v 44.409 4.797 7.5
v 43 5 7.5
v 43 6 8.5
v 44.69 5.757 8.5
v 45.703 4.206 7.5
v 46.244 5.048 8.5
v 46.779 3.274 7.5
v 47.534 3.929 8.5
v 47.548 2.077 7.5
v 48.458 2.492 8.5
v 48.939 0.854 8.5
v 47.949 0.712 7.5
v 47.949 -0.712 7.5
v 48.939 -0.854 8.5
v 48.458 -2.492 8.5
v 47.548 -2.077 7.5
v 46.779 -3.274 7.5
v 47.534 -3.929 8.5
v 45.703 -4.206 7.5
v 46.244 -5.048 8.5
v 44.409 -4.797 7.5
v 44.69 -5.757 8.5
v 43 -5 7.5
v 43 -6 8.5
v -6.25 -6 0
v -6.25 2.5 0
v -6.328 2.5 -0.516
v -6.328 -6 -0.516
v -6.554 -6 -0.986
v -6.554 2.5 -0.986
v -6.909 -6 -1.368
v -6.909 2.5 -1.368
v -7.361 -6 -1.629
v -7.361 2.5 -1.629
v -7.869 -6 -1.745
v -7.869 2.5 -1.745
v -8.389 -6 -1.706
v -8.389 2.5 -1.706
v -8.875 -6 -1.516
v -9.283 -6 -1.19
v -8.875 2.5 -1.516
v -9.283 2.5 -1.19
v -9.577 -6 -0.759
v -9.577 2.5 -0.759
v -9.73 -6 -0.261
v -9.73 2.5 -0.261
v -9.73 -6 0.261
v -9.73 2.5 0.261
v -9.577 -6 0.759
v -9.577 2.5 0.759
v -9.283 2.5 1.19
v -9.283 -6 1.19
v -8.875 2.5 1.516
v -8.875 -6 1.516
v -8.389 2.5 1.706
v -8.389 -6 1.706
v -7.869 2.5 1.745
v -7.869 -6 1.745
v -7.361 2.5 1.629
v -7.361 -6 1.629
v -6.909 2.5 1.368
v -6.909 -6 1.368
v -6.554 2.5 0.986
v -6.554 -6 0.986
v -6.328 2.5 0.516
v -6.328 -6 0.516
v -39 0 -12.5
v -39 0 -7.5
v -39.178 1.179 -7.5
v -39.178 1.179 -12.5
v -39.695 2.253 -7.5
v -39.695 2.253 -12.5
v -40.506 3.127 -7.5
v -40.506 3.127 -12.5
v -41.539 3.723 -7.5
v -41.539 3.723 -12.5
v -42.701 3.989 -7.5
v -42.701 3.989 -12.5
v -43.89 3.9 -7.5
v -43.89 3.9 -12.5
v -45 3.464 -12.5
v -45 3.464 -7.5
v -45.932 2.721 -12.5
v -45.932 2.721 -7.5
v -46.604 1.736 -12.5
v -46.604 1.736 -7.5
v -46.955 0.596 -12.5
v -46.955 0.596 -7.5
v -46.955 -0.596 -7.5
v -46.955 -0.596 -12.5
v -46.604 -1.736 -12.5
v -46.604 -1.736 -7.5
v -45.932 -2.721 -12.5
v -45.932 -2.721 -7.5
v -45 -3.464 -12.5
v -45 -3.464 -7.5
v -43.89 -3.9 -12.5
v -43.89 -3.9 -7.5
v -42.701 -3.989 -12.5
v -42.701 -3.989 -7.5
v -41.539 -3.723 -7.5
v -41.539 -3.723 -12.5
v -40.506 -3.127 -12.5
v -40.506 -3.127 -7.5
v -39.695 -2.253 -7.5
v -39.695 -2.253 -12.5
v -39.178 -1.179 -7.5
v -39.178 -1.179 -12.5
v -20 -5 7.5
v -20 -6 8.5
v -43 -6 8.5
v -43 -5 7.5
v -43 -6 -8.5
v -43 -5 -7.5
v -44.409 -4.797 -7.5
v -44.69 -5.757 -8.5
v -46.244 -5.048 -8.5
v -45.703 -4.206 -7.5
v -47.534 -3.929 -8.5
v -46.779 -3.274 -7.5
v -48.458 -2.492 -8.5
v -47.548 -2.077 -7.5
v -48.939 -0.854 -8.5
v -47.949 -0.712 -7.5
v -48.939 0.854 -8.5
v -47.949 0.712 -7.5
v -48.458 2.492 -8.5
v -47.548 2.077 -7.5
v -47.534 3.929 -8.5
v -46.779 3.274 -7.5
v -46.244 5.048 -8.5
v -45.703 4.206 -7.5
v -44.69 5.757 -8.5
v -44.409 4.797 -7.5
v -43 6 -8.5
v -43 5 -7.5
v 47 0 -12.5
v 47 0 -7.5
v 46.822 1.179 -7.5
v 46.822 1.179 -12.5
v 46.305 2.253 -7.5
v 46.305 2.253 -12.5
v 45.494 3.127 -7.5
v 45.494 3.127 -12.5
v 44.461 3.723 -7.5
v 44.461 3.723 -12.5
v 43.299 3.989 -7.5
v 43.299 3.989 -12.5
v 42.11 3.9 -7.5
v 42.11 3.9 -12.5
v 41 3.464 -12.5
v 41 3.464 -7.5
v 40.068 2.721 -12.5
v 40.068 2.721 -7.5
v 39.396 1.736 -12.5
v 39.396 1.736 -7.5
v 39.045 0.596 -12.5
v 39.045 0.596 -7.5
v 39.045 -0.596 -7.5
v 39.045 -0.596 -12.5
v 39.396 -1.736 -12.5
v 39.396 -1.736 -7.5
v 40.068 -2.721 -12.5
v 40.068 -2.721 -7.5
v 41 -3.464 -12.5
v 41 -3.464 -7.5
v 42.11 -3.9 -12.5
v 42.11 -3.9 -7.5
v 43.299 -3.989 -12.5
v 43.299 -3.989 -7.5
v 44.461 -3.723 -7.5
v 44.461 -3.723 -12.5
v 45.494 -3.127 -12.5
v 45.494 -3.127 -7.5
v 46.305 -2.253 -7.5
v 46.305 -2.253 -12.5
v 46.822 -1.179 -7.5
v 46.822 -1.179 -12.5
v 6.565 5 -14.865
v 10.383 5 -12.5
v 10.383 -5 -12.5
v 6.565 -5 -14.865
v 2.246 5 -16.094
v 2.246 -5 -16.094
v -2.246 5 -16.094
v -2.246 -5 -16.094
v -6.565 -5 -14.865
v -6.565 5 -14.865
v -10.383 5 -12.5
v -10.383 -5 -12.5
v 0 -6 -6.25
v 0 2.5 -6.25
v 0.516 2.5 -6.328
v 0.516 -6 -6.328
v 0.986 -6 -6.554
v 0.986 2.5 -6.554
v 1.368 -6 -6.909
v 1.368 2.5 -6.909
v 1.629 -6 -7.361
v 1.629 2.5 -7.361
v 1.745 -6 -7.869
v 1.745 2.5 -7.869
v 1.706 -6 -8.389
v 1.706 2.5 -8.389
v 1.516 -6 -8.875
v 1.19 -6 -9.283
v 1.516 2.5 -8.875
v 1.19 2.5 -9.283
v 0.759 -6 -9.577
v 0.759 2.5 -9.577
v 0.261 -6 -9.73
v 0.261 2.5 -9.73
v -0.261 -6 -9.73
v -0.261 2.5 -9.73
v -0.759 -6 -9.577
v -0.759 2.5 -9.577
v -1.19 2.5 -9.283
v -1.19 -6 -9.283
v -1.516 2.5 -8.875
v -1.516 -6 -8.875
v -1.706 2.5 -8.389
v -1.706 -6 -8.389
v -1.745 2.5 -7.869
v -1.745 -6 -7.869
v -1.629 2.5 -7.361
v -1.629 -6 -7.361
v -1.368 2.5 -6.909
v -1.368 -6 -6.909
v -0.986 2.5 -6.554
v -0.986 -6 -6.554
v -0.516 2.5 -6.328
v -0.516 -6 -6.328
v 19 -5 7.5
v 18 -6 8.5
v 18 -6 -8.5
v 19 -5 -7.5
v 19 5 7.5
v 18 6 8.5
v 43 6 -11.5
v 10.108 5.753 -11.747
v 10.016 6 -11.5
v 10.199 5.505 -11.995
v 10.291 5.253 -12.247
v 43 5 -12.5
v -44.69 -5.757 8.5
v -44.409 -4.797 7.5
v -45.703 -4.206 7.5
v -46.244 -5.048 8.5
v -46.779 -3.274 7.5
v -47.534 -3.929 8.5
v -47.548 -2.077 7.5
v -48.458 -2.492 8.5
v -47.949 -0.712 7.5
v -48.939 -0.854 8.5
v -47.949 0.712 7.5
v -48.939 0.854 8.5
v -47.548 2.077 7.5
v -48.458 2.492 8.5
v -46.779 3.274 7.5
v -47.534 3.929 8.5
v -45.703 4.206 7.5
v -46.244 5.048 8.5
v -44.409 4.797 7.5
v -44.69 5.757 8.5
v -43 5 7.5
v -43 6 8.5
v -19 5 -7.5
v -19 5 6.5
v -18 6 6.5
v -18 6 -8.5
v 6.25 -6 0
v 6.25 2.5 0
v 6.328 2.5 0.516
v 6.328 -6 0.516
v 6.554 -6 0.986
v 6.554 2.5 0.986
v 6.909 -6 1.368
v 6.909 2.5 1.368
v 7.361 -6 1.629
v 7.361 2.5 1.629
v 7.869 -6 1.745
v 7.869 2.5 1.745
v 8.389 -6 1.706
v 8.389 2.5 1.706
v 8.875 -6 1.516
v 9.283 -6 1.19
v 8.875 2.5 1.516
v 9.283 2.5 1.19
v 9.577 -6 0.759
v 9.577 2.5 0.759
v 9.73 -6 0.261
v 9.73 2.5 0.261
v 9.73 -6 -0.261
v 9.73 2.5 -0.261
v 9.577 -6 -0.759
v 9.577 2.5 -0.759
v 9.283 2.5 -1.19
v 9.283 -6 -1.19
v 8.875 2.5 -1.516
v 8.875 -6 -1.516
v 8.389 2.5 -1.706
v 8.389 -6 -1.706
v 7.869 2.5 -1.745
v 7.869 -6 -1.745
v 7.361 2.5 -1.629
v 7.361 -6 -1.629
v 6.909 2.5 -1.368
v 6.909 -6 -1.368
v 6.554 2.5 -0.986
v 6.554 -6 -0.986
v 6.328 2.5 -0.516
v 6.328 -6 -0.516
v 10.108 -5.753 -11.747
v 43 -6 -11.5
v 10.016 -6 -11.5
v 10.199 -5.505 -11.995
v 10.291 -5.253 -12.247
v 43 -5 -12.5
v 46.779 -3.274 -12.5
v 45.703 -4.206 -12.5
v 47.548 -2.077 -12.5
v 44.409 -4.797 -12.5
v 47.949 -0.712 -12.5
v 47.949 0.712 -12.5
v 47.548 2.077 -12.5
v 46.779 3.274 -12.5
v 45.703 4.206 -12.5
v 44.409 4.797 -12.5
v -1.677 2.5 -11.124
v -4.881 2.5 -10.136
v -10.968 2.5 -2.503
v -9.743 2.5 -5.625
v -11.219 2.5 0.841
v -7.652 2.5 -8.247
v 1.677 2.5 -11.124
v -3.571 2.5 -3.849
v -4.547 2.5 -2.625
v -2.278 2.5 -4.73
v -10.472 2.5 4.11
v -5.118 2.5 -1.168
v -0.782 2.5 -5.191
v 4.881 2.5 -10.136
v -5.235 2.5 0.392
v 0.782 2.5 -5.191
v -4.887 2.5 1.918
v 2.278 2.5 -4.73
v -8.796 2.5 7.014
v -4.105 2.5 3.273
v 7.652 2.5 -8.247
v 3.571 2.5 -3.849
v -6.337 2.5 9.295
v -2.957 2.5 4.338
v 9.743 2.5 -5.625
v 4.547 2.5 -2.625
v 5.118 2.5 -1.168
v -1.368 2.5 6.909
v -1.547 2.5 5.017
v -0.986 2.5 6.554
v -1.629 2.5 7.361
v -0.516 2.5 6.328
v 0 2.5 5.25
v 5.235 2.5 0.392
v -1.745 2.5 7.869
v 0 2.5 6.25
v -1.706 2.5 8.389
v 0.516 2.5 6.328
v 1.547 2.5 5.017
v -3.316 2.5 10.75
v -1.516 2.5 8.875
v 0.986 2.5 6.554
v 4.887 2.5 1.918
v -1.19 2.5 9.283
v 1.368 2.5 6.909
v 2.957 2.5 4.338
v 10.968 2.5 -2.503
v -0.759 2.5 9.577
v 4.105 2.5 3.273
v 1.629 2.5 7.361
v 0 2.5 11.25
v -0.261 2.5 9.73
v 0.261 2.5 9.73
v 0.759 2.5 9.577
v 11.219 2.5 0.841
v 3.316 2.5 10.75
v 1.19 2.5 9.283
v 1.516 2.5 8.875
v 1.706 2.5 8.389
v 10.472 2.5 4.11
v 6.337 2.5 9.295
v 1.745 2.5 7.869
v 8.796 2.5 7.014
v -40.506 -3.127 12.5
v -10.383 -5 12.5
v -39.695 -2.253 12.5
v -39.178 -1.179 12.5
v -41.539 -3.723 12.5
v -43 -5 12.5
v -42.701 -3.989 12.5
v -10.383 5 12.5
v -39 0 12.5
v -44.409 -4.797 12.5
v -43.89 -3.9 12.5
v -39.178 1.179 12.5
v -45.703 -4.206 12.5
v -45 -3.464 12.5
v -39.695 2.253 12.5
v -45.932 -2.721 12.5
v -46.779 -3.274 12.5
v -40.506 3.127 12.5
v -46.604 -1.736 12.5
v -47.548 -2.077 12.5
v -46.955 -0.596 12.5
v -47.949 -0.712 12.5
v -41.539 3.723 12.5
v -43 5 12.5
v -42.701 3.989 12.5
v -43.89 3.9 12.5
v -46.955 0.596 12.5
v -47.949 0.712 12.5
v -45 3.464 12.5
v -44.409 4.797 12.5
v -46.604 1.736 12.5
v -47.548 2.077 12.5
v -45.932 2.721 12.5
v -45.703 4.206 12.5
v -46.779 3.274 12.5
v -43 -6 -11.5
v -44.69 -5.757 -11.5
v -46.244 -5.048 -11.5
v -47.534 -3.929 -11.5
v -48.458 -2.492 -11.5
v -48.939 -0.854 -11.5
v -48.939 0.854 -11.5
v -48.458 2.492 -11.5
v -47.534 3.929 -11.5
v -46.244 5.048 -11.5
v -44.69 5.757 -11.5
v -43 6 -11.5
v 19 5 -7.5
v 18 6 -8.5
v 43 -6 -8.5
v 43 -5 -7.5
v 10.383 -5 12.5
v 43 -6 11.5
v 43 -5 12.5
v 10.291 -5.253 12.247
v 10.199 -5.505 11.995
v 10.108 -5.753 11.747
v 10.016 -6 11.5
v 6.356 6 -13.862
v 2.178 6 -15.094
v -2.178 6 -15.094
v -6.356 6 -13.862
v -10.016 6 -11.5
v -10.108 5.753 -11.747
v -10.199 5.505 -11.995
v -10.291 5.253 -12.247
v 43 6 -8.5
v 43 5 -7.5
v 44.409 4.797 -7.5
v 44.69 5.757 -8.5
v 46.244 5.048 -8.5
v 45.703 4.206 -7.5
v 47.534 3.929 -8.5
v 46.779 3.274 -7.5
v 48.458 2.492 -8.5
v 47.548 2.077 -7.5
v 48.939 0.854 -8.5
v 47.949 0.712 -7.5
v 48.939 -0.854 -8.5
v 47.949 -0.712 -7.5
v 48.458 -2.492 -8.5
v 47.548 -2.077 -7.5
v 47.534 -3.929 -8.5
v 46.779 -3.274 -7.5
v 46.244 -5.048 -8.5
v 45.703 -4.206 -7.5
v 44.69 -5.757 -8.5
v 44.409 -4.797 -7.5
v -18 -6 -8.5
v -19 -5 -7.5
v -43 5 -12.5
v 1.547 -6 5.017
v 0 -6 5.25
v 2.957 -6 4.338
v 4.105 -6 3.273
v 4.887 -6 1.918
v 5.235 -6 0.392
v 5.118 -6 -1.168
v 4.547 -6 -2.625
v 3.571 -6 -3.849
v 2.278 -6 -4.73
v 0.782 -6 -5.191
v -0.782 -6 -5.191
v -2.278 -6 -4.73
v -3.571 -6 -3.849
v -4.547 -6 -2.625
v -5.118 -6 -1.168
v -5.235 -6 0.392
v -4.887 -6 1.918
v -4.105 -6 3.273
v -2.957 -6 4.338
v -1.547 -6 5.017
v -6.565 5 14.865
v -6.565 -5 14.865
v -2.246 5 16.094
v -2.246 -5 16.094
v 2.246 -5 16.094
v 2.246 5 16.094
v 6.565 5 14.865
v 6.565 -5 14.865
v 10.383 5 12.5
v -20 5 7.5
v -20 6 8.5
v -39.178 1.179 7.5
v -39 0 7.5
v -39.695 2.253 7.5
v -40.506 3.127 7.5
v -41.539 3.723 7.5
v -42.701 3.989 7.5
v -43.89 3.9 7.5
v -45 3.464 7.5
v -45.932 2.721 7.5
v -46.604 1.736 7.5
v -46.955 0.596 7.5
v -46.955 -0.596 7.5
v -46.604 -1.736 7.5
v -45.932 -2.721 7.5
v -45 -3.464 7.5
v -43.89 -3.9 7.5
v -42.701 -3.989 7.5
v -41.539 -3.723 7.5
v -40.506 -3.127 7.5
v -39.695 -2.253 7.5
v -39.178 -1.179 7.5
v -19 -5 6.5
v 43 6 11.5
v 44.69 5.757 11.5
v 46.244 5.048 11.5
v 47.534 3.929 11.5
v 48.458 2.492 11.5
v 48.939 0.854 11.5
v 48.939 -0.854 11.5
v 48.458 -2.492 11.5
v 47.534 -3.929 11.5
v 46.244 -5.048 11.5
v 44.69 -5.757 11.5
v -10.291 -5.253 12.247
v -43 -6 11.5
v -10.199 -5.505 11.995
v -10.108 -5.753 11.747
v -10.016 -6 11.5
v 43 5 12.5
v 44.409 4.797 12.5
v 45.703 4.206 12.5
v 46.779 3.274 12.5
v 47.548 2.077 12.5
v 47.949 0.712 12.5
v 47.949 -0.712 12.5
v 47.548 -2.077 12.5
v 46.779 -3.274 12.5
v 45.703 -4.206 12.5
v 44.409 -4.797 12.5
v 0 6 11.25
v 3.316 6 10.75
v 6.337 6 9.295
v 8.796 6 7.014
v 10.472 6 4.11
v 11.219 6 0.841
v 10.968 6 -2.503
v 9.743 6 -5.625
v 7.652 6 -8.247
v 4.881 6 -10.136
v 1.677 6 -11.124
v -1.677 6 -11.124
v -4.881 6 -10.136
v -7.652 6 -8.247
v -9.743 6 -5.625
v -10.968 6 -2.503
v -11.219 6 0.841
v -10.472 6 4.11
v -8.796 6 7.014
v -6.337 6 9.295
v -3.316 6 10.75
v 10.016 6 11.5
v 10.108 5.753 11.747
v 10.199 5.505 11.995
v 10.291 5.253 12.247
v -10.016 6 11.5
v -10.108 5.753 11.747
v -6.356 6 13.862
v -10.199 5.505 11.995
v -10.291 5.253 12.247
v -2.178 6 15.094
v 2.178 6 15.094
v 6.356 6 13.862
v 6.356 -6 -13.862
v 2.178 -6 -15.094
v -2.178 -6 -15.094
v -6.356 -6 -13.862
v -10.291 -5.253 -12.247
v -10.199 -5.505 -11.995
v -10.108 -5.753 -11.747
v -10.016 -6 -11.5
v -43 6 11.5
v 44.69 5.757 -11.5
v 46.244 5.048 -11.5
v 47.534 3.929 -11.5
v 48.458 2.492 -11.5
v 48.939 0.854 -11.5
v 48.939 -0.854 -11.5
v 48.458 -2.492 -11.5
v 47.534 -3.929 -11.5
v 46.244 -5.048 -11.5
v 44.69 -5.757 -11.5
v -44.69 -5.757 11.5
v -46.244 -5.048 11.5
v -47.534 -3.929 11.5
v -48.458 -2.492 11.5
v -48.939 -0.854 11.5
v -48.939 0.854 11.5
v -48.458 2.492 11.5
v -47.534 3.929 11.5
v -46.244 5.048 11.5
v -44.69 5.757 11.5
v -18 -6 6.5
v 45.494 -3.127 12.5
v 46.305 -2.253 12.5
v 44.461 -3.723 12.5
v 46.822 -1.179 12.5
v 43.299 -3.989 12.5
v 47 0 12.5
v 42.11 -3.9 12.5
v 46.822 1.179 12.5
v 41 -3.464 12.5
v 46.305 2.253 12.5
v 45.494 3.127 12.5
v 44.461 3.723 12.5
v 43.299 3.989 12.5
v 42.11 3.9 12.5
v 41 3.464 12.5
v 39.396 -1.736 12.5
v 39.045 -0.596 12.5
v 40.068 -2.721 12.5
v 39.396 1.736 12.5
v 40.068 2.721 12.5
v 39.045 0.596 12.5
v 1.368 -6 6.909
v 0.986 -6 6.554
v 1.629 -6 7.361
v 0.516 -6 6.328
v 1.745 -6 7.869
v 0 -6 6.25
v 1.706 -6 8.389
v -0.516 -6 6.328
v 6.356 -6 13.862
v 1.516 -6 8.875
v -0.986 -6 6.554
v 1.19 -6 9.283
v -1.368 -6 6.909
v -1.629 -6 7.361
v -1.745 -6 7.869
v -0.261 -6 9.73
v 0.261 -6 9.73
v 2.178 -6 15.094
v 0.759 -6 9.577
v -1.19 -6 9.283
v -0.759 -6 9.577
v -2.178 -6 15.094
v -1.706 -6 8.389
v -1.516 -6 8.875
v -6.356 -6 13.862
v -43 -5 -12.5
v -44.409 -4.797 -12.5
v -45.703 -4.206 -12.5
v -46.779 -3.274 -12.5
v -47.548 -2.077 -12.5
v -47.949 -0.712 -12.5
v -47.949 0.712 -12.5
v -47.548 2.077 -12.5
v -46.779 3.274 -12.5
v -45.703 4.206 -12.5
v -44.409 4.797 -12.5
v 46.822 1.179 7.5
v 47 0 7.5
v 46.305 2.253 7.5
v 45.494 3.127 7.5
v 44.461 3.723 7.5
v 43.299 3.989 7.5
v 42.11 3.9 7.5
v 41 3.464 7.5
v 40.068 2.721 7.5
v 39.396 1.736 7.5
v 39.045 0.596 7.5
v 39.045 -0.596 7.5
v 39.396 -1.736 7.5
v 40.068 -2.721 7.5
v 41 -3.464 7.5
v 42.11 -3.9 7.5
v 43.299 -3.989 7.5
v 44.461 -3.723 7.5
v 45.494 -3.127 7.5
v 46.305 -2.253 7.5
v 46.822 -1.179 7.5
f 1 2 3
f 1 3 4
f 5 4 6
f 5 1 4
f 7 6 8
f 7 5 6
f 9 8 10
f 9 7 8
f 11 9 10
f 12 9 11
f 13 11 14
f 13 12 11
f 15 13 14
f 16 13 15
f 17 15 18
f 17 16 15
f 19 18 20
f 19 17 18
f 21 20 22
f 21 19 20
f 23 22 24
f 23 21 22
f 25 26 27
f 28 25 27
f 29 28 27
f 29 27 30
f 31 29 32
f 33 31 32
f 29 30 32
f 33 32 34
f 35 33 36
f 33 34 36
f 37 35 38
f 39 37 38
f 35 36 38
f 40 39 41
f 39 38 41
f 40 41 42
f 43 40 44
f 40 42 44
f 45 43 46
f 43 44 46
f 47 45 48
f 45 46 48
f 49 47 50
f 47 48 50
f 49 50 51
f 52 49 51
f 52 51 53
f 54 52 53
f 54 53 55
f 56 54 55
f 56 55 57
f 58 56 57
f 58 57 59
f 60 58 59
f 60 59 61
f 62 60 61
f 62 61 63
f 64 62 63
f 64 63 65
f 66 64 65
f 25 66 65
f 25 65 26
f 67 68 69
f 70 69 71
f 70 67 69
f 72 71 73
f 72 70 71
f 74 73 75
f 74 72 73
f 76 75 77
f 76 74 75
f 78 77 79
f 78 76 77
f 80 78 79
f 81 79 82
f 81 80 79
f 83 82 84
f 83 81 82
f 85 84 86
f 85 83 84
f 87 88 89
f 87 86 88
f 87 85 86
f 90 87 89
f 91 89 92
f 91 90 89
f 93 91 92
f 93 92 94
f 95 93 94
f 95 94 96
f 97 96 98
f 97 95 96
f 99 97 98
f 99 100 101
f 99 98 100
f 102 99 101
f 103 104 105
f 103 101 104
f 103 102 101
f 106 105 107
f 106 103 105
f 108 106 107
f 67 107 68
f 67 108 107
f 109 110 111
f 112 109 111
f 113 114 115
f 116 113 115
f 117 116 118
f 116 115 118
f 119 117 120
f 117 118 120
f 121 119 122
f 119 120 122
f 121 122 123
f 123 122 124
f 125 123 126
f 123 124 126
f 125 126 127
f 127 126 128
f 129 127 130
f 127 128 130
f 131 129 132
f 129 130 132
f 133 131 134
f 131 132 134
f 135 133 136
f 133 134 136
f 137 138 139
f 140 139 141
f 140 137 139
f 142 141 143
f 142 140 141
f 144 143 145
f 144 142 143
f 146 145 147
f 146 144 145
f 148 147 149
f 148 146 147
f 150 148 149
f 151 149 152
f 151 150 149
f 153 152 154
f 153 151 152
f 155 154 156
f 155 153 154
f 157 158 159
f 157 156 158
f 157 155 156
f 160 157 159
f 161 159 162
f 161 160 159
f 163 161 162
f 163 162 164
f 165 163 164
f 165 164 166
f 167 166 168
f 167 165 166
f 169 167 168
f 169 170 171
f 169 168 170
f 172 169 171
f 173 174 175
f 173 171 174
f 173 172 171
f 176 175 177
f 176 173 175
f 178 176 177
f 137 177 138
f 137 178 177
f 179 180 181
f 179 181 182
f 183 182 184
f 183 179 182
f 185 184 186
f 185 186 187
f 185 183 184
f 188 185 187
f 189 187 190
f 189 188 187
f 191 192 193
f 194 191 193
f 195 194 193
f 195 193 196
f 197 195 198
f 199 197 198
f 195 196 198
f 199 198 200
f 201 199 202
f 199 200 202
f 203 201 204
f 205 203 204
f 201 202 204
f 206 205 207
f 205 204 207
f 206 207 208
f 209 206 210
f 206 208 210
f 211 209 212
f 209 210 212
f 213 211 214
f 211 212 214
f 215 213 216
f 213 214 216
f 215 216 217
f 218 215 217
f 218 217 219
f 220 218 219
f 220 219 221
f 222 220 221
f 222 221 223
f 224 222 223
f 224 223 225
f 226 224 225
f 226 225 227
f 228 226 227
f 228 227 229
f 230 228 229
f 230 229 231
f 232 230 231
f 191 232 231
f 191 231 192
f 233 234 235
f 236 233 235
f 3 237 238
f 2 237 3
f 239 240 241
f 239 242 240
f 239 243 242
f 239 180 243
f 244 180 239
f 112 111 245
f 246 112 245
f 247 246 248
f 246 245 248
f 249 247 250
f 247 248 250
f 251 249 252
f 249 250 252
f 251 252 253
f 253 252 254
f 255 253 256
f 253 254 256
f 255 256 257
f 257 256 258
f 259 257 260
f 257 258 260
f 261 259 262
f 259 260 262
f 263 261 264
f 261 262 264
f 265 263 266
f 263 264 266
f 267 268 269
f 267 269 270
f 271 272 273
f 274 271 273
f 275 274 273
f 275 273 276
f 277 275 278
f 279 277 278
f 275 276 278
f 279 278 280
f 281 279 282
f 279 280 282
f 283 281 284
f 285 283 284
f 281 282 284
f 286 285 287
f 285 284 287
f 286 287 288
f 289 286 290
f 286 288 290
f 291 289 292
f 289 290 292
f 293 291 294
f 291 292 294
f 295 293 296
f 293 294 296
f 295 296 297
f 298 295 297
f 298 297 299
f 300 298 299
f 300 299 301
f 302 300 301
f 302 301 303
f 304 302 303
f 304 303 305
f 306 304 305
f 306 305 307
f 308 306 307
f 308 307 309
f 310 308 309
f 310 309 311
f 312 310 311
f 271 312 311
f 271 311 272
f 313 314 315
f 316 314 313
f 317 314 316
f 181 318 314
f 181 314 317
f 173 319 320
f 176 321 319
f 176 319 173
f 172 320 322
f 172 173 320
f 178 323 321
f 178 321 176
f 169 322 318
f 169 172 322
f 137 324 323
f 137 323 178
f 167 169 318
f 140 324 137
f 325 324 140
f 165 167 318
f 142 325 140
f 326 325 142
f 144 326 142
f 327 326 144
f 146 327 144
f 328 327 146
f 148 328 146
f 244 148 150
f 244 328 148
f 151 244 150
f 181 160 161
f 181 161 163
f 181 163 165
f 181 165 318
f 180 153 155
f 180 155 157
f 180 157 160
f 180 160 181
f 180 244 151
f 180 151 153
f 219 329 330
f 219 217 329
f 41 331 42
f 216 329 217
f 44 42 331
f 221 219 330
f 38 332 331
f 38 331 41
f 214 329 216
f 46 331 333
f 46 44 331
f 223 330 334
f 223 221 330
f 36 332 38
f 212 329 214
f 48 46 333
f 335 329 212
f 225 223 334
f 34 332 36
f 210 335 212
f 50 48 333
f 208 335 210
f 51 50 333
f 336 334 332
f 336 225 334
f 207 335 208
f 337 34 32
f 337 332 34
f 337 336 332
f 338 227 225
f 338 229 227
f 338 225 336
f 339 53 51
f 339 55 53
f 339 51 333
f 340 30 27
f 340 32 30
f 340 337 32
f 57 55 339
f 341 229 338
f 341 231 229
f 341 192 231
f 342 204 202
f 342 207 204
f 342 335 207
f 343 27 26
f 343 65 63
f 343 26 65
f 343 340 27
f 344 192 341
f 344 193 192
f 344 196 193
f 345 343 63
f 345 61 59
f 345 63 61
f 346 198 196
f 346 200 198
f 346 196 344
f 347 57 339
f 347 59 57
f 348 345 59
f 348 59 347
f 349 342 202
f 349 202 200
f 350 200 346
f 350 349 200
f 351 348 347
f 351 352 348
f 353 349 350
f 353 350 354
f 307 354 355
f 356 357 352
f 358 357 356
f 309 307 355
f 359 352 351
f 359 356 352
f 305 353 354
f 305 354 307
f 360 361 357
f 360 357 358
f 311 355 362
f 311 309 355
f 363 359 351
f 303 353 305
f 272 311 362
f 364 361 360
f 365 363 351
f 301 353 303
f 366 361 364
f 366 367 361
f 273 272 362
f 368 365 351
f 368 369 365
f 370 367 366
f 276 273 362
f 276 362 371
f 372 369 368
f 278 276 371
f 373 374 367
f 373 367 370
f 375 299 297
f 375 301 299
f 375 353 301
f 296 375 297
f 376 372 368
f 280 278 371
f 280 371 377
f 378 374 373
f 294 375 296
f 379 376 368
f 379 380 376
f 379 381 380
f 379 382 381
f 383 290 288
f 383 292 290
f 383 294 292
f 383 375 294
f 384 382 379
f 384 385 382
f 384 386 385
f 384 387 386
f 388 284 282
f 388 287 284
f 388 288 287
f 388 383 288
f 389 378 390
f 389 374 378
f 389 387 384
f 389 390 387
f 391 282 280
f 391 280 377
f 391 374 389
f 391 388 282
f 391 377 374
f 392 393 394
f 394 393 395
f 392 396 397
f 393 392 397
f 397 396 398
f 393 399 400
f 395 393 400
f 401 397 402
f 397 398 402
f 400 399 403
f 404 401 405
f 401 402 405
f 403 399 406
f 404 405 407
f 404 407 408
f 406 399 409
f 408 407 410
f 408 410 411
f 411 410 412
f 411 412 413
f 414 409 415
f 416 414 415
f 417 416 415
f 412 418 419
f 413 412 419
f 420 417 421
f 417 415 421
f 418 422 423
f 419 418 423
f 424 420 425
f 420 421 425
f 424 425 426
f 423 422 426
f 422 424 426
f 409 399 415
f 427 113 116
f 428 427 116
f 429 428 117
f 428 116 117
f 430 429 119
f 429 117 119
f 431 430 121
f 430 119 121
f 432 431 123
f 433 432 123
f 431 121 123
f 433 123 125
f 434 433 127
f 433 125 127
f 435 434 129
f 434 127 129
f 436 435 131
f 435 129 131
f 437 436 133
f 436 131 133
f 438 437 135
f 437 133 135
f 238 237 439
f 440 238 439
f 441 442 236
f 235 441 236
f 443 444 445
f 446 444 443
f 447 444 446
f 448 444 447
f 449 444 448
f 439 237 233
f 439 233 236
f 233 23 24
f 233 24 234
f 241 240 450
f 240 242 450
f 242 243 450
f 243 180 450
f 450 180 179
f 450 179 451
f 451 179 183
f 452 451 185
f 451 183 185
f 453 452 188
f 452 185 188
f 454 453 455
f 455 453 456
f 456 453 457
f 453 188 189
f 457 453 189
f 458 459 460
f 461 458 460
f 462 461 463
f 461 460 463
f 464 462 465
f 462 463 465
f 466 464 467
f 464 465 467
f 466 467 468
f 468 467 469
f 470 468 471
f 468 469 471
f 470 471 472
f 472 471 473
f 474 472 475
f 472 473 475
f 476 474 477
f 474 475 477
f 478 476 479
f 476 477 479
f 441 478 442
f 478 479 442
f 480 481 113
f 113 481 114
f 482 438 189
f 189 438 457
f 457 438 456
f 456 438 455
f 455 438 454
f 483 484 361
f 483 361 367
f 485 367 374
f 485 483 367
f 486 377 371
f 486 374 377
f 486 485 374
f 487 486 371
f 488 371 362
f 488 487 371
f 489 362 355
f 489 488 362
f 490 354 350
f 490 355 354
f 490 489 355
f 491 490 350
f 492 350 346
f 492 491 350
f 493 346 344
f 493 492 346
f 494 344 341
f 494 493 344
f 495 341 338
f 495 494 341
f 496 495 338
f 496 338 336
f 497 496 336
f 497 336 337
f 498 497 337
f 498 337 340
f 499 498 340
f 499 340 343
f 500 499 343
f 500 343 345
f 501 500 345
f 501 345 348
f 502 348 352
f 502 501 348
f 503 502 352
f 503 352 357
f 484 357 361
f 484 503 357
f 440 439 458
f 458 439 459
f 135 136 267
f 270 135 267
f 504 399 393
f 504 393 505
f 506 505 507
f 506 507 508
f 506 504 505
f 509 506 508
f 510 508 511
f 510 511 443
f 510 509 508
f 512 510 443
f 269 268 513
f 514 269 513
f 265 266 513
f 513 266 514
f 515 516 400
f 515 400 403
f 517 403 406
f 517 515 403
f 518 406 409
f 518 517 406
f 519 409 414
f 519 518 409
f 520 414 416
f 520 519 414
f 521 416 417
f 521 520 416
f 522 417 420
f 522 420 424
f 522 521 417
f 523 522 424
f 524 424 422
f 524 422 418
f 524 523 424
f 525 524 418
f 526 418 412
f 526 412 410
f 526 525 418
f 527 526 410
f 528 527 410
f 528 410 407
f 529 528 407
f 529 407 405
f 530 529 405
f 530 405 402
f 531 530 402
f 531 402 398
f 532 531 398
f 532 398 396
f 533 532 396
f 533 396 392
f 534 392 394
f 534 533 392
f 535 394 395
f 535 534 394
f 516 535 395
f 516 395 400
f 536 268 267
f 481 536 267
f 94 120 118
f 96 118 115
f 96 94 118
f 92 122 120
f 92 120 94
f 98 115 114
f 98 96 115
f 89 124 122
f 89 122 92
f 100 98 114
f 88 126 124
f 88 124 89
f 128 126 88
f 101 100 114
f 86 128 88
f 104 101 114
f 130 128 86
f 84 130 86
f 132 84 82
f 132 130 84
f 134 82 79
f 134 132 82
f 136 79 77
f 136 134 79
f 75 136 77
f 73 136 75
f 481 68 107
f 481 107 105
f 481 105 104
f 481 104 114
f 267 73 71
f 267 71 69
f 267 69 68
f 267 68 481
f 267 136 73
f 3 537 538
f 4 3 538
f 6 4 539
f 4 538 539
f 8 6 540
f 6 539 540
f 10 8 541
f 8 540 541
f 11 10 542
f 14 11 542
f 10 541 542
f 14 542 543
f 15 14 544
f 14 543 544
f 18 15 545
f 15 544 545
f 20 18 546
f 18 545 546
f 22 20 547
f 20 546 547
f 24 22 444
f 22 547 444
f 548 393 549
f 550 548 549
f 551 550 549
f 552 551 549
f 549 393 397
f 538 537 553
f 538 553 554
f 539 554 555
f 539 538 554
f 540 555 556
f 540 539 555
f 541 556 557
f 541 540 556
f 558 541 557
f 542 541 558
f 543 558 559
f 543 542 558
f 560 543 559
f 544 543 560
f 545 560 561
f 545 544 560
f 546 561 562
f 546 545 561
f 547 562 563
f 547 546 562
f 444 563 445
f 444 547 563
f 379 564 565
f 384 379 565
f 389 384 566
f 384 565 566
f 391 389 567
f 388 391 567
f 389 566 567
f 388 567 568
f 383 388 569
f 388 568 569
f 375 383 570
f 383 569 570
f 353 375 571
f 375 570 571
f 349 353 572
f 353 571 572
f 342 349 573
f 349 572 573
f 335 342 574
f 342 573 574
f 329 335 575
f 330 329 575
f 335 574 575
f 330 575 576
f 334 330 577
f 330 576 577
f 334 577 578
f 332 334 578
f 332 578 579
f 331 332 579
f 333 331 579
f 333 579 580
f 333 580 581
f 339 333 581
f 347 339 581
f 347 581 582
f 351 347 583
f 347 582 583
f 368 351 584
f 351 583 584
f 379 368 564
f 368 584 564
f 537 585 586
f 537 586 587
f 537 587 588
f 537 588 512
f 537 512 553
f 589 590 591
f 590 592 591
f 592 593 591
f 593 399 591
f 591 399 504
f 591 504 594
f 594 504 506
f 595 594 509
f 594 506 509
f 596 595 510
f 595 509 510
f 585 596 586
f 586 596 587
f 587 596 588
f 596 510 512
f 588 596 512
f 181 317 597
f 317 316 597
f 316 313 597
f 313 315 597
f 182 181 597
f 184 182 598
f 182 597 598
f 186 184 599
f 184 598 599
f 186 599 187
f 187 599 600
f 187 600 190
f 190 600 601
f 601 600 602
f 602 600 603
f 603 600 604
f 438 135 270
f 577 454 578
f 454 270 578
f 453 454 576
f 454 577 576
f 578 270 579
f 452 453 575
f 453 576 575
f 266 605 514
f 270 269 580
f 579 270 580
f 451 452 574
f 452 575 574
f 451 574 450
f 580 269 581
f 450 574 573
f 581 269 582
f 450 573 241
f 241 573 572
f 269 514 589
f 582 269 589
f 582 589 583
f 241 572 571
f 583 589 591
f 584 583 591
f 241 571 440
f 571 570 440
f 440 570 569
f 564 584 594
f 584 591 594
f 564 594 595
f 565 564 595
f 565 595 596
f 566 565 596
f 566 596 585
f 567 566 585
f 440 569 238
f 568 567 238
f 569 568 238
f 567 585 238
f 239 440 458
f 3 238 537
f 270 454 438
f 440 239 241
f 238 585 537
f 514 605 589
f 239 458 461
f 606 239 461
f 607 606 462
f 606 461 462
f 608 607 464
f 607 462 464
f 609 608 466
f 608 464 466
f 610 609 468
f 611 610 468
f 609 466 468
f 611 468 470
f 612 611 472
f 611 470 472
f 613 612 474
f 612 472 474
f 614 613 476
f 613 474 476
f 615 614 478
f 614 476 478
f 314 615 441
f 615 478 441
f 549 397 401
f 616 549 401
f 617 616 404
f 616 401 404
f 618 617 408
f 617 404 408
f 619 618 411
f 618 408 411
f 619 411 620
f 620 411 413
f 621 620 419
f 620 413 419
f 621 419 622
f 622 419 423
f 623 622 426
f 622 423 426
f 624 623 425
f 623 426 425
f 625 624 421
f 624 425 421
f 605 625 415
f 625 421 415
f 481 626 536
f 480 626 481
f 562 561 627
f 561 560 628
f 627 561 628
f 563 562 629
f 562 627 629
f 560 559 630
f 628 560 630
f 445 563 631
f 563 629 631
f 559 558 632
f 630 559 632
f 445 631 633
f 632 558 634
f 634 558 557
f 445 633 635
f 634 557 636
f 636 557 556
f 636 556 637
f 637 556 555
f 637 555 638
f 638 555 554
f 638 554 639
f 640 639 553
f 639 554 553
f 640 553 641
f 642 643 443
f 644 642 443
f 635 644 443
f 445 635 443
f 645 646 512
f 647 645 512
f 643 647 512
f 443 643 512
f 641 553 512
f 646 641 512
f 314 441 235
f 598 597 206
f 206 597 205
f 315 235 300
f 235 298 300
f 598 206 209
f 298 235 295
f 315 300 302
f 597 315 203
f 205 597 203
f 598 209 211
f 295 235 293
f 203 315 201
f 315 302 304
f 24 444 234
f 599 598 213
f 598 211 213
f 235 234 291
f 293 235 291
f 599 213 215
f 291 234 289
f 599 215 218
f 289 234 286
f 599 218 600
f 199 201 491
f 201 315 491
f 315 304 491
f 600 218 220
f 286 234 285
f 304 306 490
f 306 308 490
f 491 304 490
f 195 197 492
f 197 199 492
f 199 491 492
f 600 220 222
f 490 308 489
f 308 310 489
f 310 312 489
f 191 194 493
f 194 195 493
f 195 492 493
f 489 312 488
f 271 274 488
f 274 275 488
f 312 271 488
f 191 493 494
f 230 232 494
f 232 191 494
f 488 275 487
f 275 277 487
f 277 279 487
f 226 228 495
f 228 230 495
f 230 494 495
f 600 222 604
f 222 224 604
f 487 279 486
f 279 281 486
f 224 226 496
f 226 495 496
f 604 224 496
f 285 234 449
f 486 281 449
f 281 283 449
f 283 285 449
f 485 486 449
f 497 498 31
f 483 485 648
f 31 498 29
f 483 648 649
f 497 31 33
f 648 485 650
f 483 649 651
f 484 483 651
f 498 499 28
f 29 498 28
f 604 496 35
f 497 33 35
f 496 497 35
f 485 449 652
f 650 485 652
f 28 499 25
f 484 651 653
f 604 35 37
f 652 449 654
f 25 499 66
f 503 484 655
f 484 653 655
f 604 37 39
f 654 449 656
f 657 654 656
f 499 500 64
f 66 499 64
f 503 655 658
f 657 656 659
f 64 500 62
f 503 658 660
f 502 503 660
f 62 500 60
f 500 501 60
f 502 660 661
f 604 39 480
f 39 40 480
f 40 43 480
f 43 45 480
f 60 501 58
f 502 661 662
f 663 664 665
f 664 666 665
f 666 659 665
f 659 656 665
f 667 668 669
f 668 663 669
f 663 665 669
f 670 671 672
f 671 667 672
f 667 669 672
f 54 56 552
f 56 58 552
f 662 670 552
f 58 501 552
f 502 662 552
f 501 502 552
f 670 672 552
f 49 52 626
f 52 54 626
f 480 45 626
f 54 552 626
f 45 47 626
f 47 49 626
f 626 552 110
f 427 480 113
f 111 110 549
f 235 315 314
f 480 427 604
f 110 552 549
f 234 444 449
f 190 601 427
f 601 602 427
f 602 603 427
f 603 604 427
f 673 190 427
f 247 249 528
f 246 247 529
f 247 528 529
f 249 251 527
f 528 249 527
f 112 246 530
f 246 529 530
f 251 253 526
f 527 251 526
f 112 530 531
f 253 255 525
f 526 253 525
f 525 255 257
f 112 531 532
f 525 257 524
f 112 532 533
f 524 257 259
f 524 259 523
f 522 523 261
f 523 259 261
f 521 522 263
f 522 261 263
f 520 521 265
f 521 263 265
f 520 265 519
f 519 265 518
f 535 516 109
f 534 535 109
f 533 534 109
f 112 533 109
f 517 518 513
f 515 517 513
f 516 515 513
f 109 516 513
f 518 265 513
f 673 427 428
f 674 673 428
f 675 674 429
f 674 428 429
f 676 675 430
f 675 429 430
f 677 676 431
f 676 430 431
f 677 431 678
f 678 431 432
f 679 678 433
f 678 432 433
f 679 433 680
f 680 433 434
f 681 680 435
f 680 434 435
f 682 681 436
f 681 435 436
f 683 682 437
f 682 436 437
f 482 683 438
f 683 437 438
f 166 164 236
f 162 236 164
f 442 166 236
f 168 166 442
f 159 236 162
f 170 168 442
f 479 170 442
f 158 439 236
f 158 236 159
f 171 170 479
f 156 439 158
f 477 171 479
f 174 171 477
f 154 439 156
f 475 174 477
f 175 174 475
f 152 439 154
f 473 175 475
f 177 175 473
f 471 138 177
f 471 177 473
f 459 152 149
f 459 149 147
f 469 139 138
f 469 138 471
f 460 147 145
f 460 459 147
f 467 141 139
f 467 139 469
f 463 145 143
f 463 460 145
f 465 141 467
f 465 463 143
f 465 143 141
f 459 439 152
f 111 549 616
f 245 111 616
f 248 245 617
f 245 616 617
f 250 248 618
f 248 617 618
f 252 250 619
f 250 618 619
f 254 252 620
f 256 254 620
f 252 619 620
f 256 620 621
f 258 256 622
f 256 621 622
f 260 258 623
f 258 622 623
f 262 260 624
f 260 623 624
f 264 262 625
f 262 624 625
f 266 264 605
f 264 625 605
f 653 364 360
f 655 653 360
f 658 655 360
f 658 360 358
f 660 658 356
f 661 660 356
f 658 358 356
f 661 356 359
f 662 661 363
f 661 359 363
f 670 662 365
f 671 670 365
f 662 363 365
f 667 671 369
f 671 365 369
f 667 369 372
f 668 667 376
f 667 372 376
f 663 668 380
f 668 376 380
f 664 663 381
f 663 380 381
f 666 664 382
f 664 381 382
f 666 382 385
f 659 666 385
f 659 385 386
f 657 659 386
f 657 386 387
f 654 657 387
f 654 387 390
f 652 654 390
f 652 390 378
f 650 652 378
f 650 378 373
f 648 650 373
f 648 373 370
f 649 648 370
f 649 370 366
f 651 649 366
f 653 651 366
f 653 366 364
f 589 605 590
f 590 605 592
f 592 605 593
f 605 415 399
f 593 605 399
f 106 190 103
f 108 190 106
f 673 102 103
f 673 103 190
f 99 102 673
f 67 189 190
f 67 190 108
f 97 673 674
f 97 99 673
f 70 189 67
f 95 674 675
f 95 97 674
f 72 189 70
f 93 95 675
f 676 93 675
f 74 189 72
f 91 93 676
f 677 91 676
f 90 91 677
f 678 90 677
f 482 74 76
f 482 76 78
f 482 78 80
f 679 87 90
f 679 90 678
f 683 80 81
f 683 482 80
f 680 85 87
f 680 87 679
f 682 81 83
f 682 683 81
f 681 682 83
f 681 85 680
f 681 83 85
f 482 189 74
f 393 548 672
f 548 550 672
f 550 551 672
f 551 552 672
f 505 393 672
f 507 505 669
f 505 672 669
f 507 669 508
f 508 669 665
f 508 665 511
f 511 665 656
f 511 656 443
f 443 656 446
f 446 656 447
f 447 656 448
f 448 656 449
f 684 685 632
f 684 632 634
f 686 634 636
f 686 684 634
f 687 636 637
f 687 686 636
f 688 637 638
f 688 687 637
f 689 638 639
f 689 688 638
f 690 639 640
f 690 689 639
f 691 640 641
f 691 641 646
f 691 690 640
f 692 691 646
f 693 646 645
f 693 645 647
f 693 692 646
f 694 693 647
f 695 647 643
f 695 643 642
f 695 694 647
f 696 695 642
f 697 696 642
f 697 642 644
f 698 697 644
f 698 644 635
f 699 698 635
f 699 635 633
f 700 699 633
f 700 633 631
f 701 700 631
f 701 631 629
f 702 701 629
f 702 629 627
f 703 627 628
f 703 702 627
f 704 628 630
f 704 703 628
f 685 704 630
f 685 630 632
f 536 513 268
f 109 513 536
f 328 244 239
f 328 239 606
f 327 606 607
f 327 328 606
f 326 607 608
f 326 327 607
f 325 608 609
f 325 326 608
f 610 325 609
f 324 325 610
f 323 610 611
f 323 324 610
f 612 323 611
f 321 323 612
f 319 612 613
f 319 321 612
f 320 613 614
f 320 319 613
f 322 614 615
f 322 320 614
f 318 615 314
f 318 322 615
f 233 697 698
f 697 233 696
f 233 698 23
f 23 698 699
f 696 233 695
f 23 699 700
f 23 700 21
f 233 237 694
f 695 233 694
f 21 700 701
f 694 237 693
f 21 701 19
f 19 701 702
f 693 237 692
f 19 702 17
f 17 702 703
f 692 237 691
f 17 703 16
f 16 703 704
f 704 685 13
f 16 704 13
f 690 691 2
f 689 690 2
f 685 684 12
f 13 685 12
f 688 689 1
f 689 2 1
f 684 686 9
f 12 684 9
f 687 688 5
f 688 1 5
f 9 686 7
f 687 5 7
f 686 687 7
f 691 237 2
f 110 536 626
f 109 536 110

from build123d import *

# Parameters (mm, degrees)
CROQUIS1_R                 = 4
SALIENTE_EXTRUIR1_DEPTH    = 12.5
CROQUIS2_W                 = 30
CROQUIS2_H                 = 15
CORTAR_EXTRUIR1_DEPTH      = 52.973550966
CROQUIS3_R                 = 4
CORTAR_EXTRUIR2_DEPTH      = 52.973550966
CROQUIS4_R                 = 11.25
CORTAR_EXTRUIR3_DEPTH      = 3.5
CORTAR_EXTRUIR4_DEPTH      = 52.278650528
CORTAR_EXTRUIR4_DEPTH_BACK = 52.278650528
CROQUIS5_R                 = 5.25
CROQUIS6_R                 = 16.25
CROQUIS6_R_2               = 11.25
SALIENTE_EXTRUIR2_DEPTH    = 12
CHAFL_N1_SIZE              = 1
SKETCH1_R                  = 1.75
CUT_EXTRUDE1_DEPTH         = 10
CIRPATTERN1_COUNT          = 4


with BuildPart() as part:
    # Croquis1 → Saliente-Extruir1 (new, symmetric)
    with BuildSketch(Plane.XY):
        with BuildLine():
            Line((-43, 6), (43, 6))
            ThreePointArc((43, 6), (49, 0), (43, -6))
            Line((43, -6), (-43, -6))
            ThreePointArc((-43, -6), (-49, 0), (-43, 6))
        make_face()
        with Locations((-43, 0)):
            Circle(CROQUIS1_R, mode=Mode.SUBTRACT)
        with Locations((43, 0)):
            Circle(CROQUIS1_R, mode=Mode.SUBTRACT)
    extrude(amount=SALIENTE_EXTRUIR1_DEPTH, both=True)

    # Croquis2 → Cortar-Extruir1 (cut, through all)
    with BuildSketch(Plane(origin=(0, 6, 0), x_dir=(1, 0, 0), z_dir=(0, 1, 0))):
        with Locations((-34, 0)):
            Rectangle(CROQUIS2_W, CROQUIS2_H)
        with Locations((34, 0)):
            Rectangle(CROQUIS2_W, CROQUIS2_H)
    extrude(amount=-CORTAR_EXTRUIR1_DEPTH, mode=Mode.SUBTRACT)

    # Croquis3 → Cortar-Extruir2 (cut, through all)
    with BuildSketch(Plane(origin=(0, 6, 0), x_dir=(1, 0, 0), z_dir=(0, 1, 0))):
        with Locations(Location((0, 0, 0), (0, 0, 270))):
            Circle(CROQUIS3_R)
    extrude(amount=-CORTAR_EXTRUIR2_DEPTH, mode=Mode.SUBTRACT)

    # Croquis4 → Cortar-Extruir3 (cut)
    with BuildSketch(Plane(origin=(0, 6, 0), x_dir=(1, 0, 0), z_dir=(0, 1, 0))):
        with Locations(Location((0, 0, 0), (0, 0, 270))):
            Circle(CROQUIS4_R)
    extrude(amount=-CORTAR_EXTRUIR3_DEPTH, mode=Mode.SUBTRACT)

    # Croquis5 → Cortar-Extruir4 (cut, two sides: drawn at the far end of the back side and taken through both)
    with BuildSketch(Plane(origin=(0, 2.5, 0), x_dir=(1, 0, 0), z_dir=(0, 1, 0)).offset(-CORTAR_EXTRUIR4_DEPTH_BACK)):
        with Locations(Location((0, 0, 0), (0, 0, 270))):
            Circle(CROQUIS5_R)
    extrude(amount=CORTAR_EXTRUIR4_DEPTH + CORTAR_EXTRUIR4_DEPTH_BACK, mode=Mode.SUBTRACT)

    # Croquis6 → Saliente-Extruir2 (add)
    with BuildSketch(Plane(origin=(0, 6, 0), x_dir=(1, 0, 0), z_dir=(0, 1, 0))):
        Circle(CROQUIS6_R)
        with Locations(Location((0, 0, 0), (0, 0, 270))):
            Circle(CROQUIS6_R_2, mode=Mode.SUBTRACT)
    extrude(amount=-SALIENTE_EXTRUIR2_DEPTH)

    # Chaflán1
    chafl_n1_edges = [part.edges().sort_by_distance(p)[0] for p in [
        (0, -6, -16.25),
        (0, 6, -16.25),
        (0, 6, 16.25),
        (0, -6, 16.25),
        (49, 0, 12.5),
        (26.691639914, 6, 12.5),
        (-49, 0, -7.5),
        (-31, -6, -7.5),
        (-49, 0, 7.5),
        (-31, -6, 7.5),
        (-19, 0, 7.5),
        (-19, -6, 0),
        (-31, 6, 7.5),
        (-19, 6, 0),
        (-31, 6, -7.5),
        (-49, 0, 12.5),
        (26.691639914, 6, -12.5),
        (31, 6, 7.5),
        (31, 6, -7.5),
        (19, 6, 0),
        (49, 0, -7.5),
        (31, -6, -7.5),
        (49, 0, 7.5),
        (31, -6, 7.5),
        (49, 0, -12.5),
        (19, -6, 0),
        (-26.691639914, -6, -12.5),
        (-49, 0, -12.5),
        (-26.691639914, -6, 12.5),
        (-26.691639914, 6, 12.5),
        (-26.691639914, 6, -12.5),
        (26.691639914, -6, -12.5),
        (26.691639914, -6, 12.5),
    ]]
    chamfer(chafl_n1_edges, length=CHAFL_N1_SIZE)

    # Sketch1 → Cut-Extrude1 (cut)
    with BuildSketch(Plane(origin=(0, 2.5, 0), x_dir=(1, 0, 0), z_dir=(0, 1, 0))):
        with Locations(Location((0, 8, 0), (0, 0, 270))):
            Circle(SKETCH1_R)
    cut_extrude1 = extrude(amount=-CUT_EXTRUDE1_DEPTH, mode=Mode.SUBTRACT)

    # CirPattern1: Cut-Extrude1 ×4 about axis
    cirpattern1_axis = Axis((0, 0, 0), (0, 1, 0))
    for i in range(1, CIRPATTERN1_COUNT):
        add(cut_extrude1.rotate(cirpattern1_axis, i * 360 / CIRPATTERN1_COUNT), mode=Mode.SUBTRACT)


solid = part.part
